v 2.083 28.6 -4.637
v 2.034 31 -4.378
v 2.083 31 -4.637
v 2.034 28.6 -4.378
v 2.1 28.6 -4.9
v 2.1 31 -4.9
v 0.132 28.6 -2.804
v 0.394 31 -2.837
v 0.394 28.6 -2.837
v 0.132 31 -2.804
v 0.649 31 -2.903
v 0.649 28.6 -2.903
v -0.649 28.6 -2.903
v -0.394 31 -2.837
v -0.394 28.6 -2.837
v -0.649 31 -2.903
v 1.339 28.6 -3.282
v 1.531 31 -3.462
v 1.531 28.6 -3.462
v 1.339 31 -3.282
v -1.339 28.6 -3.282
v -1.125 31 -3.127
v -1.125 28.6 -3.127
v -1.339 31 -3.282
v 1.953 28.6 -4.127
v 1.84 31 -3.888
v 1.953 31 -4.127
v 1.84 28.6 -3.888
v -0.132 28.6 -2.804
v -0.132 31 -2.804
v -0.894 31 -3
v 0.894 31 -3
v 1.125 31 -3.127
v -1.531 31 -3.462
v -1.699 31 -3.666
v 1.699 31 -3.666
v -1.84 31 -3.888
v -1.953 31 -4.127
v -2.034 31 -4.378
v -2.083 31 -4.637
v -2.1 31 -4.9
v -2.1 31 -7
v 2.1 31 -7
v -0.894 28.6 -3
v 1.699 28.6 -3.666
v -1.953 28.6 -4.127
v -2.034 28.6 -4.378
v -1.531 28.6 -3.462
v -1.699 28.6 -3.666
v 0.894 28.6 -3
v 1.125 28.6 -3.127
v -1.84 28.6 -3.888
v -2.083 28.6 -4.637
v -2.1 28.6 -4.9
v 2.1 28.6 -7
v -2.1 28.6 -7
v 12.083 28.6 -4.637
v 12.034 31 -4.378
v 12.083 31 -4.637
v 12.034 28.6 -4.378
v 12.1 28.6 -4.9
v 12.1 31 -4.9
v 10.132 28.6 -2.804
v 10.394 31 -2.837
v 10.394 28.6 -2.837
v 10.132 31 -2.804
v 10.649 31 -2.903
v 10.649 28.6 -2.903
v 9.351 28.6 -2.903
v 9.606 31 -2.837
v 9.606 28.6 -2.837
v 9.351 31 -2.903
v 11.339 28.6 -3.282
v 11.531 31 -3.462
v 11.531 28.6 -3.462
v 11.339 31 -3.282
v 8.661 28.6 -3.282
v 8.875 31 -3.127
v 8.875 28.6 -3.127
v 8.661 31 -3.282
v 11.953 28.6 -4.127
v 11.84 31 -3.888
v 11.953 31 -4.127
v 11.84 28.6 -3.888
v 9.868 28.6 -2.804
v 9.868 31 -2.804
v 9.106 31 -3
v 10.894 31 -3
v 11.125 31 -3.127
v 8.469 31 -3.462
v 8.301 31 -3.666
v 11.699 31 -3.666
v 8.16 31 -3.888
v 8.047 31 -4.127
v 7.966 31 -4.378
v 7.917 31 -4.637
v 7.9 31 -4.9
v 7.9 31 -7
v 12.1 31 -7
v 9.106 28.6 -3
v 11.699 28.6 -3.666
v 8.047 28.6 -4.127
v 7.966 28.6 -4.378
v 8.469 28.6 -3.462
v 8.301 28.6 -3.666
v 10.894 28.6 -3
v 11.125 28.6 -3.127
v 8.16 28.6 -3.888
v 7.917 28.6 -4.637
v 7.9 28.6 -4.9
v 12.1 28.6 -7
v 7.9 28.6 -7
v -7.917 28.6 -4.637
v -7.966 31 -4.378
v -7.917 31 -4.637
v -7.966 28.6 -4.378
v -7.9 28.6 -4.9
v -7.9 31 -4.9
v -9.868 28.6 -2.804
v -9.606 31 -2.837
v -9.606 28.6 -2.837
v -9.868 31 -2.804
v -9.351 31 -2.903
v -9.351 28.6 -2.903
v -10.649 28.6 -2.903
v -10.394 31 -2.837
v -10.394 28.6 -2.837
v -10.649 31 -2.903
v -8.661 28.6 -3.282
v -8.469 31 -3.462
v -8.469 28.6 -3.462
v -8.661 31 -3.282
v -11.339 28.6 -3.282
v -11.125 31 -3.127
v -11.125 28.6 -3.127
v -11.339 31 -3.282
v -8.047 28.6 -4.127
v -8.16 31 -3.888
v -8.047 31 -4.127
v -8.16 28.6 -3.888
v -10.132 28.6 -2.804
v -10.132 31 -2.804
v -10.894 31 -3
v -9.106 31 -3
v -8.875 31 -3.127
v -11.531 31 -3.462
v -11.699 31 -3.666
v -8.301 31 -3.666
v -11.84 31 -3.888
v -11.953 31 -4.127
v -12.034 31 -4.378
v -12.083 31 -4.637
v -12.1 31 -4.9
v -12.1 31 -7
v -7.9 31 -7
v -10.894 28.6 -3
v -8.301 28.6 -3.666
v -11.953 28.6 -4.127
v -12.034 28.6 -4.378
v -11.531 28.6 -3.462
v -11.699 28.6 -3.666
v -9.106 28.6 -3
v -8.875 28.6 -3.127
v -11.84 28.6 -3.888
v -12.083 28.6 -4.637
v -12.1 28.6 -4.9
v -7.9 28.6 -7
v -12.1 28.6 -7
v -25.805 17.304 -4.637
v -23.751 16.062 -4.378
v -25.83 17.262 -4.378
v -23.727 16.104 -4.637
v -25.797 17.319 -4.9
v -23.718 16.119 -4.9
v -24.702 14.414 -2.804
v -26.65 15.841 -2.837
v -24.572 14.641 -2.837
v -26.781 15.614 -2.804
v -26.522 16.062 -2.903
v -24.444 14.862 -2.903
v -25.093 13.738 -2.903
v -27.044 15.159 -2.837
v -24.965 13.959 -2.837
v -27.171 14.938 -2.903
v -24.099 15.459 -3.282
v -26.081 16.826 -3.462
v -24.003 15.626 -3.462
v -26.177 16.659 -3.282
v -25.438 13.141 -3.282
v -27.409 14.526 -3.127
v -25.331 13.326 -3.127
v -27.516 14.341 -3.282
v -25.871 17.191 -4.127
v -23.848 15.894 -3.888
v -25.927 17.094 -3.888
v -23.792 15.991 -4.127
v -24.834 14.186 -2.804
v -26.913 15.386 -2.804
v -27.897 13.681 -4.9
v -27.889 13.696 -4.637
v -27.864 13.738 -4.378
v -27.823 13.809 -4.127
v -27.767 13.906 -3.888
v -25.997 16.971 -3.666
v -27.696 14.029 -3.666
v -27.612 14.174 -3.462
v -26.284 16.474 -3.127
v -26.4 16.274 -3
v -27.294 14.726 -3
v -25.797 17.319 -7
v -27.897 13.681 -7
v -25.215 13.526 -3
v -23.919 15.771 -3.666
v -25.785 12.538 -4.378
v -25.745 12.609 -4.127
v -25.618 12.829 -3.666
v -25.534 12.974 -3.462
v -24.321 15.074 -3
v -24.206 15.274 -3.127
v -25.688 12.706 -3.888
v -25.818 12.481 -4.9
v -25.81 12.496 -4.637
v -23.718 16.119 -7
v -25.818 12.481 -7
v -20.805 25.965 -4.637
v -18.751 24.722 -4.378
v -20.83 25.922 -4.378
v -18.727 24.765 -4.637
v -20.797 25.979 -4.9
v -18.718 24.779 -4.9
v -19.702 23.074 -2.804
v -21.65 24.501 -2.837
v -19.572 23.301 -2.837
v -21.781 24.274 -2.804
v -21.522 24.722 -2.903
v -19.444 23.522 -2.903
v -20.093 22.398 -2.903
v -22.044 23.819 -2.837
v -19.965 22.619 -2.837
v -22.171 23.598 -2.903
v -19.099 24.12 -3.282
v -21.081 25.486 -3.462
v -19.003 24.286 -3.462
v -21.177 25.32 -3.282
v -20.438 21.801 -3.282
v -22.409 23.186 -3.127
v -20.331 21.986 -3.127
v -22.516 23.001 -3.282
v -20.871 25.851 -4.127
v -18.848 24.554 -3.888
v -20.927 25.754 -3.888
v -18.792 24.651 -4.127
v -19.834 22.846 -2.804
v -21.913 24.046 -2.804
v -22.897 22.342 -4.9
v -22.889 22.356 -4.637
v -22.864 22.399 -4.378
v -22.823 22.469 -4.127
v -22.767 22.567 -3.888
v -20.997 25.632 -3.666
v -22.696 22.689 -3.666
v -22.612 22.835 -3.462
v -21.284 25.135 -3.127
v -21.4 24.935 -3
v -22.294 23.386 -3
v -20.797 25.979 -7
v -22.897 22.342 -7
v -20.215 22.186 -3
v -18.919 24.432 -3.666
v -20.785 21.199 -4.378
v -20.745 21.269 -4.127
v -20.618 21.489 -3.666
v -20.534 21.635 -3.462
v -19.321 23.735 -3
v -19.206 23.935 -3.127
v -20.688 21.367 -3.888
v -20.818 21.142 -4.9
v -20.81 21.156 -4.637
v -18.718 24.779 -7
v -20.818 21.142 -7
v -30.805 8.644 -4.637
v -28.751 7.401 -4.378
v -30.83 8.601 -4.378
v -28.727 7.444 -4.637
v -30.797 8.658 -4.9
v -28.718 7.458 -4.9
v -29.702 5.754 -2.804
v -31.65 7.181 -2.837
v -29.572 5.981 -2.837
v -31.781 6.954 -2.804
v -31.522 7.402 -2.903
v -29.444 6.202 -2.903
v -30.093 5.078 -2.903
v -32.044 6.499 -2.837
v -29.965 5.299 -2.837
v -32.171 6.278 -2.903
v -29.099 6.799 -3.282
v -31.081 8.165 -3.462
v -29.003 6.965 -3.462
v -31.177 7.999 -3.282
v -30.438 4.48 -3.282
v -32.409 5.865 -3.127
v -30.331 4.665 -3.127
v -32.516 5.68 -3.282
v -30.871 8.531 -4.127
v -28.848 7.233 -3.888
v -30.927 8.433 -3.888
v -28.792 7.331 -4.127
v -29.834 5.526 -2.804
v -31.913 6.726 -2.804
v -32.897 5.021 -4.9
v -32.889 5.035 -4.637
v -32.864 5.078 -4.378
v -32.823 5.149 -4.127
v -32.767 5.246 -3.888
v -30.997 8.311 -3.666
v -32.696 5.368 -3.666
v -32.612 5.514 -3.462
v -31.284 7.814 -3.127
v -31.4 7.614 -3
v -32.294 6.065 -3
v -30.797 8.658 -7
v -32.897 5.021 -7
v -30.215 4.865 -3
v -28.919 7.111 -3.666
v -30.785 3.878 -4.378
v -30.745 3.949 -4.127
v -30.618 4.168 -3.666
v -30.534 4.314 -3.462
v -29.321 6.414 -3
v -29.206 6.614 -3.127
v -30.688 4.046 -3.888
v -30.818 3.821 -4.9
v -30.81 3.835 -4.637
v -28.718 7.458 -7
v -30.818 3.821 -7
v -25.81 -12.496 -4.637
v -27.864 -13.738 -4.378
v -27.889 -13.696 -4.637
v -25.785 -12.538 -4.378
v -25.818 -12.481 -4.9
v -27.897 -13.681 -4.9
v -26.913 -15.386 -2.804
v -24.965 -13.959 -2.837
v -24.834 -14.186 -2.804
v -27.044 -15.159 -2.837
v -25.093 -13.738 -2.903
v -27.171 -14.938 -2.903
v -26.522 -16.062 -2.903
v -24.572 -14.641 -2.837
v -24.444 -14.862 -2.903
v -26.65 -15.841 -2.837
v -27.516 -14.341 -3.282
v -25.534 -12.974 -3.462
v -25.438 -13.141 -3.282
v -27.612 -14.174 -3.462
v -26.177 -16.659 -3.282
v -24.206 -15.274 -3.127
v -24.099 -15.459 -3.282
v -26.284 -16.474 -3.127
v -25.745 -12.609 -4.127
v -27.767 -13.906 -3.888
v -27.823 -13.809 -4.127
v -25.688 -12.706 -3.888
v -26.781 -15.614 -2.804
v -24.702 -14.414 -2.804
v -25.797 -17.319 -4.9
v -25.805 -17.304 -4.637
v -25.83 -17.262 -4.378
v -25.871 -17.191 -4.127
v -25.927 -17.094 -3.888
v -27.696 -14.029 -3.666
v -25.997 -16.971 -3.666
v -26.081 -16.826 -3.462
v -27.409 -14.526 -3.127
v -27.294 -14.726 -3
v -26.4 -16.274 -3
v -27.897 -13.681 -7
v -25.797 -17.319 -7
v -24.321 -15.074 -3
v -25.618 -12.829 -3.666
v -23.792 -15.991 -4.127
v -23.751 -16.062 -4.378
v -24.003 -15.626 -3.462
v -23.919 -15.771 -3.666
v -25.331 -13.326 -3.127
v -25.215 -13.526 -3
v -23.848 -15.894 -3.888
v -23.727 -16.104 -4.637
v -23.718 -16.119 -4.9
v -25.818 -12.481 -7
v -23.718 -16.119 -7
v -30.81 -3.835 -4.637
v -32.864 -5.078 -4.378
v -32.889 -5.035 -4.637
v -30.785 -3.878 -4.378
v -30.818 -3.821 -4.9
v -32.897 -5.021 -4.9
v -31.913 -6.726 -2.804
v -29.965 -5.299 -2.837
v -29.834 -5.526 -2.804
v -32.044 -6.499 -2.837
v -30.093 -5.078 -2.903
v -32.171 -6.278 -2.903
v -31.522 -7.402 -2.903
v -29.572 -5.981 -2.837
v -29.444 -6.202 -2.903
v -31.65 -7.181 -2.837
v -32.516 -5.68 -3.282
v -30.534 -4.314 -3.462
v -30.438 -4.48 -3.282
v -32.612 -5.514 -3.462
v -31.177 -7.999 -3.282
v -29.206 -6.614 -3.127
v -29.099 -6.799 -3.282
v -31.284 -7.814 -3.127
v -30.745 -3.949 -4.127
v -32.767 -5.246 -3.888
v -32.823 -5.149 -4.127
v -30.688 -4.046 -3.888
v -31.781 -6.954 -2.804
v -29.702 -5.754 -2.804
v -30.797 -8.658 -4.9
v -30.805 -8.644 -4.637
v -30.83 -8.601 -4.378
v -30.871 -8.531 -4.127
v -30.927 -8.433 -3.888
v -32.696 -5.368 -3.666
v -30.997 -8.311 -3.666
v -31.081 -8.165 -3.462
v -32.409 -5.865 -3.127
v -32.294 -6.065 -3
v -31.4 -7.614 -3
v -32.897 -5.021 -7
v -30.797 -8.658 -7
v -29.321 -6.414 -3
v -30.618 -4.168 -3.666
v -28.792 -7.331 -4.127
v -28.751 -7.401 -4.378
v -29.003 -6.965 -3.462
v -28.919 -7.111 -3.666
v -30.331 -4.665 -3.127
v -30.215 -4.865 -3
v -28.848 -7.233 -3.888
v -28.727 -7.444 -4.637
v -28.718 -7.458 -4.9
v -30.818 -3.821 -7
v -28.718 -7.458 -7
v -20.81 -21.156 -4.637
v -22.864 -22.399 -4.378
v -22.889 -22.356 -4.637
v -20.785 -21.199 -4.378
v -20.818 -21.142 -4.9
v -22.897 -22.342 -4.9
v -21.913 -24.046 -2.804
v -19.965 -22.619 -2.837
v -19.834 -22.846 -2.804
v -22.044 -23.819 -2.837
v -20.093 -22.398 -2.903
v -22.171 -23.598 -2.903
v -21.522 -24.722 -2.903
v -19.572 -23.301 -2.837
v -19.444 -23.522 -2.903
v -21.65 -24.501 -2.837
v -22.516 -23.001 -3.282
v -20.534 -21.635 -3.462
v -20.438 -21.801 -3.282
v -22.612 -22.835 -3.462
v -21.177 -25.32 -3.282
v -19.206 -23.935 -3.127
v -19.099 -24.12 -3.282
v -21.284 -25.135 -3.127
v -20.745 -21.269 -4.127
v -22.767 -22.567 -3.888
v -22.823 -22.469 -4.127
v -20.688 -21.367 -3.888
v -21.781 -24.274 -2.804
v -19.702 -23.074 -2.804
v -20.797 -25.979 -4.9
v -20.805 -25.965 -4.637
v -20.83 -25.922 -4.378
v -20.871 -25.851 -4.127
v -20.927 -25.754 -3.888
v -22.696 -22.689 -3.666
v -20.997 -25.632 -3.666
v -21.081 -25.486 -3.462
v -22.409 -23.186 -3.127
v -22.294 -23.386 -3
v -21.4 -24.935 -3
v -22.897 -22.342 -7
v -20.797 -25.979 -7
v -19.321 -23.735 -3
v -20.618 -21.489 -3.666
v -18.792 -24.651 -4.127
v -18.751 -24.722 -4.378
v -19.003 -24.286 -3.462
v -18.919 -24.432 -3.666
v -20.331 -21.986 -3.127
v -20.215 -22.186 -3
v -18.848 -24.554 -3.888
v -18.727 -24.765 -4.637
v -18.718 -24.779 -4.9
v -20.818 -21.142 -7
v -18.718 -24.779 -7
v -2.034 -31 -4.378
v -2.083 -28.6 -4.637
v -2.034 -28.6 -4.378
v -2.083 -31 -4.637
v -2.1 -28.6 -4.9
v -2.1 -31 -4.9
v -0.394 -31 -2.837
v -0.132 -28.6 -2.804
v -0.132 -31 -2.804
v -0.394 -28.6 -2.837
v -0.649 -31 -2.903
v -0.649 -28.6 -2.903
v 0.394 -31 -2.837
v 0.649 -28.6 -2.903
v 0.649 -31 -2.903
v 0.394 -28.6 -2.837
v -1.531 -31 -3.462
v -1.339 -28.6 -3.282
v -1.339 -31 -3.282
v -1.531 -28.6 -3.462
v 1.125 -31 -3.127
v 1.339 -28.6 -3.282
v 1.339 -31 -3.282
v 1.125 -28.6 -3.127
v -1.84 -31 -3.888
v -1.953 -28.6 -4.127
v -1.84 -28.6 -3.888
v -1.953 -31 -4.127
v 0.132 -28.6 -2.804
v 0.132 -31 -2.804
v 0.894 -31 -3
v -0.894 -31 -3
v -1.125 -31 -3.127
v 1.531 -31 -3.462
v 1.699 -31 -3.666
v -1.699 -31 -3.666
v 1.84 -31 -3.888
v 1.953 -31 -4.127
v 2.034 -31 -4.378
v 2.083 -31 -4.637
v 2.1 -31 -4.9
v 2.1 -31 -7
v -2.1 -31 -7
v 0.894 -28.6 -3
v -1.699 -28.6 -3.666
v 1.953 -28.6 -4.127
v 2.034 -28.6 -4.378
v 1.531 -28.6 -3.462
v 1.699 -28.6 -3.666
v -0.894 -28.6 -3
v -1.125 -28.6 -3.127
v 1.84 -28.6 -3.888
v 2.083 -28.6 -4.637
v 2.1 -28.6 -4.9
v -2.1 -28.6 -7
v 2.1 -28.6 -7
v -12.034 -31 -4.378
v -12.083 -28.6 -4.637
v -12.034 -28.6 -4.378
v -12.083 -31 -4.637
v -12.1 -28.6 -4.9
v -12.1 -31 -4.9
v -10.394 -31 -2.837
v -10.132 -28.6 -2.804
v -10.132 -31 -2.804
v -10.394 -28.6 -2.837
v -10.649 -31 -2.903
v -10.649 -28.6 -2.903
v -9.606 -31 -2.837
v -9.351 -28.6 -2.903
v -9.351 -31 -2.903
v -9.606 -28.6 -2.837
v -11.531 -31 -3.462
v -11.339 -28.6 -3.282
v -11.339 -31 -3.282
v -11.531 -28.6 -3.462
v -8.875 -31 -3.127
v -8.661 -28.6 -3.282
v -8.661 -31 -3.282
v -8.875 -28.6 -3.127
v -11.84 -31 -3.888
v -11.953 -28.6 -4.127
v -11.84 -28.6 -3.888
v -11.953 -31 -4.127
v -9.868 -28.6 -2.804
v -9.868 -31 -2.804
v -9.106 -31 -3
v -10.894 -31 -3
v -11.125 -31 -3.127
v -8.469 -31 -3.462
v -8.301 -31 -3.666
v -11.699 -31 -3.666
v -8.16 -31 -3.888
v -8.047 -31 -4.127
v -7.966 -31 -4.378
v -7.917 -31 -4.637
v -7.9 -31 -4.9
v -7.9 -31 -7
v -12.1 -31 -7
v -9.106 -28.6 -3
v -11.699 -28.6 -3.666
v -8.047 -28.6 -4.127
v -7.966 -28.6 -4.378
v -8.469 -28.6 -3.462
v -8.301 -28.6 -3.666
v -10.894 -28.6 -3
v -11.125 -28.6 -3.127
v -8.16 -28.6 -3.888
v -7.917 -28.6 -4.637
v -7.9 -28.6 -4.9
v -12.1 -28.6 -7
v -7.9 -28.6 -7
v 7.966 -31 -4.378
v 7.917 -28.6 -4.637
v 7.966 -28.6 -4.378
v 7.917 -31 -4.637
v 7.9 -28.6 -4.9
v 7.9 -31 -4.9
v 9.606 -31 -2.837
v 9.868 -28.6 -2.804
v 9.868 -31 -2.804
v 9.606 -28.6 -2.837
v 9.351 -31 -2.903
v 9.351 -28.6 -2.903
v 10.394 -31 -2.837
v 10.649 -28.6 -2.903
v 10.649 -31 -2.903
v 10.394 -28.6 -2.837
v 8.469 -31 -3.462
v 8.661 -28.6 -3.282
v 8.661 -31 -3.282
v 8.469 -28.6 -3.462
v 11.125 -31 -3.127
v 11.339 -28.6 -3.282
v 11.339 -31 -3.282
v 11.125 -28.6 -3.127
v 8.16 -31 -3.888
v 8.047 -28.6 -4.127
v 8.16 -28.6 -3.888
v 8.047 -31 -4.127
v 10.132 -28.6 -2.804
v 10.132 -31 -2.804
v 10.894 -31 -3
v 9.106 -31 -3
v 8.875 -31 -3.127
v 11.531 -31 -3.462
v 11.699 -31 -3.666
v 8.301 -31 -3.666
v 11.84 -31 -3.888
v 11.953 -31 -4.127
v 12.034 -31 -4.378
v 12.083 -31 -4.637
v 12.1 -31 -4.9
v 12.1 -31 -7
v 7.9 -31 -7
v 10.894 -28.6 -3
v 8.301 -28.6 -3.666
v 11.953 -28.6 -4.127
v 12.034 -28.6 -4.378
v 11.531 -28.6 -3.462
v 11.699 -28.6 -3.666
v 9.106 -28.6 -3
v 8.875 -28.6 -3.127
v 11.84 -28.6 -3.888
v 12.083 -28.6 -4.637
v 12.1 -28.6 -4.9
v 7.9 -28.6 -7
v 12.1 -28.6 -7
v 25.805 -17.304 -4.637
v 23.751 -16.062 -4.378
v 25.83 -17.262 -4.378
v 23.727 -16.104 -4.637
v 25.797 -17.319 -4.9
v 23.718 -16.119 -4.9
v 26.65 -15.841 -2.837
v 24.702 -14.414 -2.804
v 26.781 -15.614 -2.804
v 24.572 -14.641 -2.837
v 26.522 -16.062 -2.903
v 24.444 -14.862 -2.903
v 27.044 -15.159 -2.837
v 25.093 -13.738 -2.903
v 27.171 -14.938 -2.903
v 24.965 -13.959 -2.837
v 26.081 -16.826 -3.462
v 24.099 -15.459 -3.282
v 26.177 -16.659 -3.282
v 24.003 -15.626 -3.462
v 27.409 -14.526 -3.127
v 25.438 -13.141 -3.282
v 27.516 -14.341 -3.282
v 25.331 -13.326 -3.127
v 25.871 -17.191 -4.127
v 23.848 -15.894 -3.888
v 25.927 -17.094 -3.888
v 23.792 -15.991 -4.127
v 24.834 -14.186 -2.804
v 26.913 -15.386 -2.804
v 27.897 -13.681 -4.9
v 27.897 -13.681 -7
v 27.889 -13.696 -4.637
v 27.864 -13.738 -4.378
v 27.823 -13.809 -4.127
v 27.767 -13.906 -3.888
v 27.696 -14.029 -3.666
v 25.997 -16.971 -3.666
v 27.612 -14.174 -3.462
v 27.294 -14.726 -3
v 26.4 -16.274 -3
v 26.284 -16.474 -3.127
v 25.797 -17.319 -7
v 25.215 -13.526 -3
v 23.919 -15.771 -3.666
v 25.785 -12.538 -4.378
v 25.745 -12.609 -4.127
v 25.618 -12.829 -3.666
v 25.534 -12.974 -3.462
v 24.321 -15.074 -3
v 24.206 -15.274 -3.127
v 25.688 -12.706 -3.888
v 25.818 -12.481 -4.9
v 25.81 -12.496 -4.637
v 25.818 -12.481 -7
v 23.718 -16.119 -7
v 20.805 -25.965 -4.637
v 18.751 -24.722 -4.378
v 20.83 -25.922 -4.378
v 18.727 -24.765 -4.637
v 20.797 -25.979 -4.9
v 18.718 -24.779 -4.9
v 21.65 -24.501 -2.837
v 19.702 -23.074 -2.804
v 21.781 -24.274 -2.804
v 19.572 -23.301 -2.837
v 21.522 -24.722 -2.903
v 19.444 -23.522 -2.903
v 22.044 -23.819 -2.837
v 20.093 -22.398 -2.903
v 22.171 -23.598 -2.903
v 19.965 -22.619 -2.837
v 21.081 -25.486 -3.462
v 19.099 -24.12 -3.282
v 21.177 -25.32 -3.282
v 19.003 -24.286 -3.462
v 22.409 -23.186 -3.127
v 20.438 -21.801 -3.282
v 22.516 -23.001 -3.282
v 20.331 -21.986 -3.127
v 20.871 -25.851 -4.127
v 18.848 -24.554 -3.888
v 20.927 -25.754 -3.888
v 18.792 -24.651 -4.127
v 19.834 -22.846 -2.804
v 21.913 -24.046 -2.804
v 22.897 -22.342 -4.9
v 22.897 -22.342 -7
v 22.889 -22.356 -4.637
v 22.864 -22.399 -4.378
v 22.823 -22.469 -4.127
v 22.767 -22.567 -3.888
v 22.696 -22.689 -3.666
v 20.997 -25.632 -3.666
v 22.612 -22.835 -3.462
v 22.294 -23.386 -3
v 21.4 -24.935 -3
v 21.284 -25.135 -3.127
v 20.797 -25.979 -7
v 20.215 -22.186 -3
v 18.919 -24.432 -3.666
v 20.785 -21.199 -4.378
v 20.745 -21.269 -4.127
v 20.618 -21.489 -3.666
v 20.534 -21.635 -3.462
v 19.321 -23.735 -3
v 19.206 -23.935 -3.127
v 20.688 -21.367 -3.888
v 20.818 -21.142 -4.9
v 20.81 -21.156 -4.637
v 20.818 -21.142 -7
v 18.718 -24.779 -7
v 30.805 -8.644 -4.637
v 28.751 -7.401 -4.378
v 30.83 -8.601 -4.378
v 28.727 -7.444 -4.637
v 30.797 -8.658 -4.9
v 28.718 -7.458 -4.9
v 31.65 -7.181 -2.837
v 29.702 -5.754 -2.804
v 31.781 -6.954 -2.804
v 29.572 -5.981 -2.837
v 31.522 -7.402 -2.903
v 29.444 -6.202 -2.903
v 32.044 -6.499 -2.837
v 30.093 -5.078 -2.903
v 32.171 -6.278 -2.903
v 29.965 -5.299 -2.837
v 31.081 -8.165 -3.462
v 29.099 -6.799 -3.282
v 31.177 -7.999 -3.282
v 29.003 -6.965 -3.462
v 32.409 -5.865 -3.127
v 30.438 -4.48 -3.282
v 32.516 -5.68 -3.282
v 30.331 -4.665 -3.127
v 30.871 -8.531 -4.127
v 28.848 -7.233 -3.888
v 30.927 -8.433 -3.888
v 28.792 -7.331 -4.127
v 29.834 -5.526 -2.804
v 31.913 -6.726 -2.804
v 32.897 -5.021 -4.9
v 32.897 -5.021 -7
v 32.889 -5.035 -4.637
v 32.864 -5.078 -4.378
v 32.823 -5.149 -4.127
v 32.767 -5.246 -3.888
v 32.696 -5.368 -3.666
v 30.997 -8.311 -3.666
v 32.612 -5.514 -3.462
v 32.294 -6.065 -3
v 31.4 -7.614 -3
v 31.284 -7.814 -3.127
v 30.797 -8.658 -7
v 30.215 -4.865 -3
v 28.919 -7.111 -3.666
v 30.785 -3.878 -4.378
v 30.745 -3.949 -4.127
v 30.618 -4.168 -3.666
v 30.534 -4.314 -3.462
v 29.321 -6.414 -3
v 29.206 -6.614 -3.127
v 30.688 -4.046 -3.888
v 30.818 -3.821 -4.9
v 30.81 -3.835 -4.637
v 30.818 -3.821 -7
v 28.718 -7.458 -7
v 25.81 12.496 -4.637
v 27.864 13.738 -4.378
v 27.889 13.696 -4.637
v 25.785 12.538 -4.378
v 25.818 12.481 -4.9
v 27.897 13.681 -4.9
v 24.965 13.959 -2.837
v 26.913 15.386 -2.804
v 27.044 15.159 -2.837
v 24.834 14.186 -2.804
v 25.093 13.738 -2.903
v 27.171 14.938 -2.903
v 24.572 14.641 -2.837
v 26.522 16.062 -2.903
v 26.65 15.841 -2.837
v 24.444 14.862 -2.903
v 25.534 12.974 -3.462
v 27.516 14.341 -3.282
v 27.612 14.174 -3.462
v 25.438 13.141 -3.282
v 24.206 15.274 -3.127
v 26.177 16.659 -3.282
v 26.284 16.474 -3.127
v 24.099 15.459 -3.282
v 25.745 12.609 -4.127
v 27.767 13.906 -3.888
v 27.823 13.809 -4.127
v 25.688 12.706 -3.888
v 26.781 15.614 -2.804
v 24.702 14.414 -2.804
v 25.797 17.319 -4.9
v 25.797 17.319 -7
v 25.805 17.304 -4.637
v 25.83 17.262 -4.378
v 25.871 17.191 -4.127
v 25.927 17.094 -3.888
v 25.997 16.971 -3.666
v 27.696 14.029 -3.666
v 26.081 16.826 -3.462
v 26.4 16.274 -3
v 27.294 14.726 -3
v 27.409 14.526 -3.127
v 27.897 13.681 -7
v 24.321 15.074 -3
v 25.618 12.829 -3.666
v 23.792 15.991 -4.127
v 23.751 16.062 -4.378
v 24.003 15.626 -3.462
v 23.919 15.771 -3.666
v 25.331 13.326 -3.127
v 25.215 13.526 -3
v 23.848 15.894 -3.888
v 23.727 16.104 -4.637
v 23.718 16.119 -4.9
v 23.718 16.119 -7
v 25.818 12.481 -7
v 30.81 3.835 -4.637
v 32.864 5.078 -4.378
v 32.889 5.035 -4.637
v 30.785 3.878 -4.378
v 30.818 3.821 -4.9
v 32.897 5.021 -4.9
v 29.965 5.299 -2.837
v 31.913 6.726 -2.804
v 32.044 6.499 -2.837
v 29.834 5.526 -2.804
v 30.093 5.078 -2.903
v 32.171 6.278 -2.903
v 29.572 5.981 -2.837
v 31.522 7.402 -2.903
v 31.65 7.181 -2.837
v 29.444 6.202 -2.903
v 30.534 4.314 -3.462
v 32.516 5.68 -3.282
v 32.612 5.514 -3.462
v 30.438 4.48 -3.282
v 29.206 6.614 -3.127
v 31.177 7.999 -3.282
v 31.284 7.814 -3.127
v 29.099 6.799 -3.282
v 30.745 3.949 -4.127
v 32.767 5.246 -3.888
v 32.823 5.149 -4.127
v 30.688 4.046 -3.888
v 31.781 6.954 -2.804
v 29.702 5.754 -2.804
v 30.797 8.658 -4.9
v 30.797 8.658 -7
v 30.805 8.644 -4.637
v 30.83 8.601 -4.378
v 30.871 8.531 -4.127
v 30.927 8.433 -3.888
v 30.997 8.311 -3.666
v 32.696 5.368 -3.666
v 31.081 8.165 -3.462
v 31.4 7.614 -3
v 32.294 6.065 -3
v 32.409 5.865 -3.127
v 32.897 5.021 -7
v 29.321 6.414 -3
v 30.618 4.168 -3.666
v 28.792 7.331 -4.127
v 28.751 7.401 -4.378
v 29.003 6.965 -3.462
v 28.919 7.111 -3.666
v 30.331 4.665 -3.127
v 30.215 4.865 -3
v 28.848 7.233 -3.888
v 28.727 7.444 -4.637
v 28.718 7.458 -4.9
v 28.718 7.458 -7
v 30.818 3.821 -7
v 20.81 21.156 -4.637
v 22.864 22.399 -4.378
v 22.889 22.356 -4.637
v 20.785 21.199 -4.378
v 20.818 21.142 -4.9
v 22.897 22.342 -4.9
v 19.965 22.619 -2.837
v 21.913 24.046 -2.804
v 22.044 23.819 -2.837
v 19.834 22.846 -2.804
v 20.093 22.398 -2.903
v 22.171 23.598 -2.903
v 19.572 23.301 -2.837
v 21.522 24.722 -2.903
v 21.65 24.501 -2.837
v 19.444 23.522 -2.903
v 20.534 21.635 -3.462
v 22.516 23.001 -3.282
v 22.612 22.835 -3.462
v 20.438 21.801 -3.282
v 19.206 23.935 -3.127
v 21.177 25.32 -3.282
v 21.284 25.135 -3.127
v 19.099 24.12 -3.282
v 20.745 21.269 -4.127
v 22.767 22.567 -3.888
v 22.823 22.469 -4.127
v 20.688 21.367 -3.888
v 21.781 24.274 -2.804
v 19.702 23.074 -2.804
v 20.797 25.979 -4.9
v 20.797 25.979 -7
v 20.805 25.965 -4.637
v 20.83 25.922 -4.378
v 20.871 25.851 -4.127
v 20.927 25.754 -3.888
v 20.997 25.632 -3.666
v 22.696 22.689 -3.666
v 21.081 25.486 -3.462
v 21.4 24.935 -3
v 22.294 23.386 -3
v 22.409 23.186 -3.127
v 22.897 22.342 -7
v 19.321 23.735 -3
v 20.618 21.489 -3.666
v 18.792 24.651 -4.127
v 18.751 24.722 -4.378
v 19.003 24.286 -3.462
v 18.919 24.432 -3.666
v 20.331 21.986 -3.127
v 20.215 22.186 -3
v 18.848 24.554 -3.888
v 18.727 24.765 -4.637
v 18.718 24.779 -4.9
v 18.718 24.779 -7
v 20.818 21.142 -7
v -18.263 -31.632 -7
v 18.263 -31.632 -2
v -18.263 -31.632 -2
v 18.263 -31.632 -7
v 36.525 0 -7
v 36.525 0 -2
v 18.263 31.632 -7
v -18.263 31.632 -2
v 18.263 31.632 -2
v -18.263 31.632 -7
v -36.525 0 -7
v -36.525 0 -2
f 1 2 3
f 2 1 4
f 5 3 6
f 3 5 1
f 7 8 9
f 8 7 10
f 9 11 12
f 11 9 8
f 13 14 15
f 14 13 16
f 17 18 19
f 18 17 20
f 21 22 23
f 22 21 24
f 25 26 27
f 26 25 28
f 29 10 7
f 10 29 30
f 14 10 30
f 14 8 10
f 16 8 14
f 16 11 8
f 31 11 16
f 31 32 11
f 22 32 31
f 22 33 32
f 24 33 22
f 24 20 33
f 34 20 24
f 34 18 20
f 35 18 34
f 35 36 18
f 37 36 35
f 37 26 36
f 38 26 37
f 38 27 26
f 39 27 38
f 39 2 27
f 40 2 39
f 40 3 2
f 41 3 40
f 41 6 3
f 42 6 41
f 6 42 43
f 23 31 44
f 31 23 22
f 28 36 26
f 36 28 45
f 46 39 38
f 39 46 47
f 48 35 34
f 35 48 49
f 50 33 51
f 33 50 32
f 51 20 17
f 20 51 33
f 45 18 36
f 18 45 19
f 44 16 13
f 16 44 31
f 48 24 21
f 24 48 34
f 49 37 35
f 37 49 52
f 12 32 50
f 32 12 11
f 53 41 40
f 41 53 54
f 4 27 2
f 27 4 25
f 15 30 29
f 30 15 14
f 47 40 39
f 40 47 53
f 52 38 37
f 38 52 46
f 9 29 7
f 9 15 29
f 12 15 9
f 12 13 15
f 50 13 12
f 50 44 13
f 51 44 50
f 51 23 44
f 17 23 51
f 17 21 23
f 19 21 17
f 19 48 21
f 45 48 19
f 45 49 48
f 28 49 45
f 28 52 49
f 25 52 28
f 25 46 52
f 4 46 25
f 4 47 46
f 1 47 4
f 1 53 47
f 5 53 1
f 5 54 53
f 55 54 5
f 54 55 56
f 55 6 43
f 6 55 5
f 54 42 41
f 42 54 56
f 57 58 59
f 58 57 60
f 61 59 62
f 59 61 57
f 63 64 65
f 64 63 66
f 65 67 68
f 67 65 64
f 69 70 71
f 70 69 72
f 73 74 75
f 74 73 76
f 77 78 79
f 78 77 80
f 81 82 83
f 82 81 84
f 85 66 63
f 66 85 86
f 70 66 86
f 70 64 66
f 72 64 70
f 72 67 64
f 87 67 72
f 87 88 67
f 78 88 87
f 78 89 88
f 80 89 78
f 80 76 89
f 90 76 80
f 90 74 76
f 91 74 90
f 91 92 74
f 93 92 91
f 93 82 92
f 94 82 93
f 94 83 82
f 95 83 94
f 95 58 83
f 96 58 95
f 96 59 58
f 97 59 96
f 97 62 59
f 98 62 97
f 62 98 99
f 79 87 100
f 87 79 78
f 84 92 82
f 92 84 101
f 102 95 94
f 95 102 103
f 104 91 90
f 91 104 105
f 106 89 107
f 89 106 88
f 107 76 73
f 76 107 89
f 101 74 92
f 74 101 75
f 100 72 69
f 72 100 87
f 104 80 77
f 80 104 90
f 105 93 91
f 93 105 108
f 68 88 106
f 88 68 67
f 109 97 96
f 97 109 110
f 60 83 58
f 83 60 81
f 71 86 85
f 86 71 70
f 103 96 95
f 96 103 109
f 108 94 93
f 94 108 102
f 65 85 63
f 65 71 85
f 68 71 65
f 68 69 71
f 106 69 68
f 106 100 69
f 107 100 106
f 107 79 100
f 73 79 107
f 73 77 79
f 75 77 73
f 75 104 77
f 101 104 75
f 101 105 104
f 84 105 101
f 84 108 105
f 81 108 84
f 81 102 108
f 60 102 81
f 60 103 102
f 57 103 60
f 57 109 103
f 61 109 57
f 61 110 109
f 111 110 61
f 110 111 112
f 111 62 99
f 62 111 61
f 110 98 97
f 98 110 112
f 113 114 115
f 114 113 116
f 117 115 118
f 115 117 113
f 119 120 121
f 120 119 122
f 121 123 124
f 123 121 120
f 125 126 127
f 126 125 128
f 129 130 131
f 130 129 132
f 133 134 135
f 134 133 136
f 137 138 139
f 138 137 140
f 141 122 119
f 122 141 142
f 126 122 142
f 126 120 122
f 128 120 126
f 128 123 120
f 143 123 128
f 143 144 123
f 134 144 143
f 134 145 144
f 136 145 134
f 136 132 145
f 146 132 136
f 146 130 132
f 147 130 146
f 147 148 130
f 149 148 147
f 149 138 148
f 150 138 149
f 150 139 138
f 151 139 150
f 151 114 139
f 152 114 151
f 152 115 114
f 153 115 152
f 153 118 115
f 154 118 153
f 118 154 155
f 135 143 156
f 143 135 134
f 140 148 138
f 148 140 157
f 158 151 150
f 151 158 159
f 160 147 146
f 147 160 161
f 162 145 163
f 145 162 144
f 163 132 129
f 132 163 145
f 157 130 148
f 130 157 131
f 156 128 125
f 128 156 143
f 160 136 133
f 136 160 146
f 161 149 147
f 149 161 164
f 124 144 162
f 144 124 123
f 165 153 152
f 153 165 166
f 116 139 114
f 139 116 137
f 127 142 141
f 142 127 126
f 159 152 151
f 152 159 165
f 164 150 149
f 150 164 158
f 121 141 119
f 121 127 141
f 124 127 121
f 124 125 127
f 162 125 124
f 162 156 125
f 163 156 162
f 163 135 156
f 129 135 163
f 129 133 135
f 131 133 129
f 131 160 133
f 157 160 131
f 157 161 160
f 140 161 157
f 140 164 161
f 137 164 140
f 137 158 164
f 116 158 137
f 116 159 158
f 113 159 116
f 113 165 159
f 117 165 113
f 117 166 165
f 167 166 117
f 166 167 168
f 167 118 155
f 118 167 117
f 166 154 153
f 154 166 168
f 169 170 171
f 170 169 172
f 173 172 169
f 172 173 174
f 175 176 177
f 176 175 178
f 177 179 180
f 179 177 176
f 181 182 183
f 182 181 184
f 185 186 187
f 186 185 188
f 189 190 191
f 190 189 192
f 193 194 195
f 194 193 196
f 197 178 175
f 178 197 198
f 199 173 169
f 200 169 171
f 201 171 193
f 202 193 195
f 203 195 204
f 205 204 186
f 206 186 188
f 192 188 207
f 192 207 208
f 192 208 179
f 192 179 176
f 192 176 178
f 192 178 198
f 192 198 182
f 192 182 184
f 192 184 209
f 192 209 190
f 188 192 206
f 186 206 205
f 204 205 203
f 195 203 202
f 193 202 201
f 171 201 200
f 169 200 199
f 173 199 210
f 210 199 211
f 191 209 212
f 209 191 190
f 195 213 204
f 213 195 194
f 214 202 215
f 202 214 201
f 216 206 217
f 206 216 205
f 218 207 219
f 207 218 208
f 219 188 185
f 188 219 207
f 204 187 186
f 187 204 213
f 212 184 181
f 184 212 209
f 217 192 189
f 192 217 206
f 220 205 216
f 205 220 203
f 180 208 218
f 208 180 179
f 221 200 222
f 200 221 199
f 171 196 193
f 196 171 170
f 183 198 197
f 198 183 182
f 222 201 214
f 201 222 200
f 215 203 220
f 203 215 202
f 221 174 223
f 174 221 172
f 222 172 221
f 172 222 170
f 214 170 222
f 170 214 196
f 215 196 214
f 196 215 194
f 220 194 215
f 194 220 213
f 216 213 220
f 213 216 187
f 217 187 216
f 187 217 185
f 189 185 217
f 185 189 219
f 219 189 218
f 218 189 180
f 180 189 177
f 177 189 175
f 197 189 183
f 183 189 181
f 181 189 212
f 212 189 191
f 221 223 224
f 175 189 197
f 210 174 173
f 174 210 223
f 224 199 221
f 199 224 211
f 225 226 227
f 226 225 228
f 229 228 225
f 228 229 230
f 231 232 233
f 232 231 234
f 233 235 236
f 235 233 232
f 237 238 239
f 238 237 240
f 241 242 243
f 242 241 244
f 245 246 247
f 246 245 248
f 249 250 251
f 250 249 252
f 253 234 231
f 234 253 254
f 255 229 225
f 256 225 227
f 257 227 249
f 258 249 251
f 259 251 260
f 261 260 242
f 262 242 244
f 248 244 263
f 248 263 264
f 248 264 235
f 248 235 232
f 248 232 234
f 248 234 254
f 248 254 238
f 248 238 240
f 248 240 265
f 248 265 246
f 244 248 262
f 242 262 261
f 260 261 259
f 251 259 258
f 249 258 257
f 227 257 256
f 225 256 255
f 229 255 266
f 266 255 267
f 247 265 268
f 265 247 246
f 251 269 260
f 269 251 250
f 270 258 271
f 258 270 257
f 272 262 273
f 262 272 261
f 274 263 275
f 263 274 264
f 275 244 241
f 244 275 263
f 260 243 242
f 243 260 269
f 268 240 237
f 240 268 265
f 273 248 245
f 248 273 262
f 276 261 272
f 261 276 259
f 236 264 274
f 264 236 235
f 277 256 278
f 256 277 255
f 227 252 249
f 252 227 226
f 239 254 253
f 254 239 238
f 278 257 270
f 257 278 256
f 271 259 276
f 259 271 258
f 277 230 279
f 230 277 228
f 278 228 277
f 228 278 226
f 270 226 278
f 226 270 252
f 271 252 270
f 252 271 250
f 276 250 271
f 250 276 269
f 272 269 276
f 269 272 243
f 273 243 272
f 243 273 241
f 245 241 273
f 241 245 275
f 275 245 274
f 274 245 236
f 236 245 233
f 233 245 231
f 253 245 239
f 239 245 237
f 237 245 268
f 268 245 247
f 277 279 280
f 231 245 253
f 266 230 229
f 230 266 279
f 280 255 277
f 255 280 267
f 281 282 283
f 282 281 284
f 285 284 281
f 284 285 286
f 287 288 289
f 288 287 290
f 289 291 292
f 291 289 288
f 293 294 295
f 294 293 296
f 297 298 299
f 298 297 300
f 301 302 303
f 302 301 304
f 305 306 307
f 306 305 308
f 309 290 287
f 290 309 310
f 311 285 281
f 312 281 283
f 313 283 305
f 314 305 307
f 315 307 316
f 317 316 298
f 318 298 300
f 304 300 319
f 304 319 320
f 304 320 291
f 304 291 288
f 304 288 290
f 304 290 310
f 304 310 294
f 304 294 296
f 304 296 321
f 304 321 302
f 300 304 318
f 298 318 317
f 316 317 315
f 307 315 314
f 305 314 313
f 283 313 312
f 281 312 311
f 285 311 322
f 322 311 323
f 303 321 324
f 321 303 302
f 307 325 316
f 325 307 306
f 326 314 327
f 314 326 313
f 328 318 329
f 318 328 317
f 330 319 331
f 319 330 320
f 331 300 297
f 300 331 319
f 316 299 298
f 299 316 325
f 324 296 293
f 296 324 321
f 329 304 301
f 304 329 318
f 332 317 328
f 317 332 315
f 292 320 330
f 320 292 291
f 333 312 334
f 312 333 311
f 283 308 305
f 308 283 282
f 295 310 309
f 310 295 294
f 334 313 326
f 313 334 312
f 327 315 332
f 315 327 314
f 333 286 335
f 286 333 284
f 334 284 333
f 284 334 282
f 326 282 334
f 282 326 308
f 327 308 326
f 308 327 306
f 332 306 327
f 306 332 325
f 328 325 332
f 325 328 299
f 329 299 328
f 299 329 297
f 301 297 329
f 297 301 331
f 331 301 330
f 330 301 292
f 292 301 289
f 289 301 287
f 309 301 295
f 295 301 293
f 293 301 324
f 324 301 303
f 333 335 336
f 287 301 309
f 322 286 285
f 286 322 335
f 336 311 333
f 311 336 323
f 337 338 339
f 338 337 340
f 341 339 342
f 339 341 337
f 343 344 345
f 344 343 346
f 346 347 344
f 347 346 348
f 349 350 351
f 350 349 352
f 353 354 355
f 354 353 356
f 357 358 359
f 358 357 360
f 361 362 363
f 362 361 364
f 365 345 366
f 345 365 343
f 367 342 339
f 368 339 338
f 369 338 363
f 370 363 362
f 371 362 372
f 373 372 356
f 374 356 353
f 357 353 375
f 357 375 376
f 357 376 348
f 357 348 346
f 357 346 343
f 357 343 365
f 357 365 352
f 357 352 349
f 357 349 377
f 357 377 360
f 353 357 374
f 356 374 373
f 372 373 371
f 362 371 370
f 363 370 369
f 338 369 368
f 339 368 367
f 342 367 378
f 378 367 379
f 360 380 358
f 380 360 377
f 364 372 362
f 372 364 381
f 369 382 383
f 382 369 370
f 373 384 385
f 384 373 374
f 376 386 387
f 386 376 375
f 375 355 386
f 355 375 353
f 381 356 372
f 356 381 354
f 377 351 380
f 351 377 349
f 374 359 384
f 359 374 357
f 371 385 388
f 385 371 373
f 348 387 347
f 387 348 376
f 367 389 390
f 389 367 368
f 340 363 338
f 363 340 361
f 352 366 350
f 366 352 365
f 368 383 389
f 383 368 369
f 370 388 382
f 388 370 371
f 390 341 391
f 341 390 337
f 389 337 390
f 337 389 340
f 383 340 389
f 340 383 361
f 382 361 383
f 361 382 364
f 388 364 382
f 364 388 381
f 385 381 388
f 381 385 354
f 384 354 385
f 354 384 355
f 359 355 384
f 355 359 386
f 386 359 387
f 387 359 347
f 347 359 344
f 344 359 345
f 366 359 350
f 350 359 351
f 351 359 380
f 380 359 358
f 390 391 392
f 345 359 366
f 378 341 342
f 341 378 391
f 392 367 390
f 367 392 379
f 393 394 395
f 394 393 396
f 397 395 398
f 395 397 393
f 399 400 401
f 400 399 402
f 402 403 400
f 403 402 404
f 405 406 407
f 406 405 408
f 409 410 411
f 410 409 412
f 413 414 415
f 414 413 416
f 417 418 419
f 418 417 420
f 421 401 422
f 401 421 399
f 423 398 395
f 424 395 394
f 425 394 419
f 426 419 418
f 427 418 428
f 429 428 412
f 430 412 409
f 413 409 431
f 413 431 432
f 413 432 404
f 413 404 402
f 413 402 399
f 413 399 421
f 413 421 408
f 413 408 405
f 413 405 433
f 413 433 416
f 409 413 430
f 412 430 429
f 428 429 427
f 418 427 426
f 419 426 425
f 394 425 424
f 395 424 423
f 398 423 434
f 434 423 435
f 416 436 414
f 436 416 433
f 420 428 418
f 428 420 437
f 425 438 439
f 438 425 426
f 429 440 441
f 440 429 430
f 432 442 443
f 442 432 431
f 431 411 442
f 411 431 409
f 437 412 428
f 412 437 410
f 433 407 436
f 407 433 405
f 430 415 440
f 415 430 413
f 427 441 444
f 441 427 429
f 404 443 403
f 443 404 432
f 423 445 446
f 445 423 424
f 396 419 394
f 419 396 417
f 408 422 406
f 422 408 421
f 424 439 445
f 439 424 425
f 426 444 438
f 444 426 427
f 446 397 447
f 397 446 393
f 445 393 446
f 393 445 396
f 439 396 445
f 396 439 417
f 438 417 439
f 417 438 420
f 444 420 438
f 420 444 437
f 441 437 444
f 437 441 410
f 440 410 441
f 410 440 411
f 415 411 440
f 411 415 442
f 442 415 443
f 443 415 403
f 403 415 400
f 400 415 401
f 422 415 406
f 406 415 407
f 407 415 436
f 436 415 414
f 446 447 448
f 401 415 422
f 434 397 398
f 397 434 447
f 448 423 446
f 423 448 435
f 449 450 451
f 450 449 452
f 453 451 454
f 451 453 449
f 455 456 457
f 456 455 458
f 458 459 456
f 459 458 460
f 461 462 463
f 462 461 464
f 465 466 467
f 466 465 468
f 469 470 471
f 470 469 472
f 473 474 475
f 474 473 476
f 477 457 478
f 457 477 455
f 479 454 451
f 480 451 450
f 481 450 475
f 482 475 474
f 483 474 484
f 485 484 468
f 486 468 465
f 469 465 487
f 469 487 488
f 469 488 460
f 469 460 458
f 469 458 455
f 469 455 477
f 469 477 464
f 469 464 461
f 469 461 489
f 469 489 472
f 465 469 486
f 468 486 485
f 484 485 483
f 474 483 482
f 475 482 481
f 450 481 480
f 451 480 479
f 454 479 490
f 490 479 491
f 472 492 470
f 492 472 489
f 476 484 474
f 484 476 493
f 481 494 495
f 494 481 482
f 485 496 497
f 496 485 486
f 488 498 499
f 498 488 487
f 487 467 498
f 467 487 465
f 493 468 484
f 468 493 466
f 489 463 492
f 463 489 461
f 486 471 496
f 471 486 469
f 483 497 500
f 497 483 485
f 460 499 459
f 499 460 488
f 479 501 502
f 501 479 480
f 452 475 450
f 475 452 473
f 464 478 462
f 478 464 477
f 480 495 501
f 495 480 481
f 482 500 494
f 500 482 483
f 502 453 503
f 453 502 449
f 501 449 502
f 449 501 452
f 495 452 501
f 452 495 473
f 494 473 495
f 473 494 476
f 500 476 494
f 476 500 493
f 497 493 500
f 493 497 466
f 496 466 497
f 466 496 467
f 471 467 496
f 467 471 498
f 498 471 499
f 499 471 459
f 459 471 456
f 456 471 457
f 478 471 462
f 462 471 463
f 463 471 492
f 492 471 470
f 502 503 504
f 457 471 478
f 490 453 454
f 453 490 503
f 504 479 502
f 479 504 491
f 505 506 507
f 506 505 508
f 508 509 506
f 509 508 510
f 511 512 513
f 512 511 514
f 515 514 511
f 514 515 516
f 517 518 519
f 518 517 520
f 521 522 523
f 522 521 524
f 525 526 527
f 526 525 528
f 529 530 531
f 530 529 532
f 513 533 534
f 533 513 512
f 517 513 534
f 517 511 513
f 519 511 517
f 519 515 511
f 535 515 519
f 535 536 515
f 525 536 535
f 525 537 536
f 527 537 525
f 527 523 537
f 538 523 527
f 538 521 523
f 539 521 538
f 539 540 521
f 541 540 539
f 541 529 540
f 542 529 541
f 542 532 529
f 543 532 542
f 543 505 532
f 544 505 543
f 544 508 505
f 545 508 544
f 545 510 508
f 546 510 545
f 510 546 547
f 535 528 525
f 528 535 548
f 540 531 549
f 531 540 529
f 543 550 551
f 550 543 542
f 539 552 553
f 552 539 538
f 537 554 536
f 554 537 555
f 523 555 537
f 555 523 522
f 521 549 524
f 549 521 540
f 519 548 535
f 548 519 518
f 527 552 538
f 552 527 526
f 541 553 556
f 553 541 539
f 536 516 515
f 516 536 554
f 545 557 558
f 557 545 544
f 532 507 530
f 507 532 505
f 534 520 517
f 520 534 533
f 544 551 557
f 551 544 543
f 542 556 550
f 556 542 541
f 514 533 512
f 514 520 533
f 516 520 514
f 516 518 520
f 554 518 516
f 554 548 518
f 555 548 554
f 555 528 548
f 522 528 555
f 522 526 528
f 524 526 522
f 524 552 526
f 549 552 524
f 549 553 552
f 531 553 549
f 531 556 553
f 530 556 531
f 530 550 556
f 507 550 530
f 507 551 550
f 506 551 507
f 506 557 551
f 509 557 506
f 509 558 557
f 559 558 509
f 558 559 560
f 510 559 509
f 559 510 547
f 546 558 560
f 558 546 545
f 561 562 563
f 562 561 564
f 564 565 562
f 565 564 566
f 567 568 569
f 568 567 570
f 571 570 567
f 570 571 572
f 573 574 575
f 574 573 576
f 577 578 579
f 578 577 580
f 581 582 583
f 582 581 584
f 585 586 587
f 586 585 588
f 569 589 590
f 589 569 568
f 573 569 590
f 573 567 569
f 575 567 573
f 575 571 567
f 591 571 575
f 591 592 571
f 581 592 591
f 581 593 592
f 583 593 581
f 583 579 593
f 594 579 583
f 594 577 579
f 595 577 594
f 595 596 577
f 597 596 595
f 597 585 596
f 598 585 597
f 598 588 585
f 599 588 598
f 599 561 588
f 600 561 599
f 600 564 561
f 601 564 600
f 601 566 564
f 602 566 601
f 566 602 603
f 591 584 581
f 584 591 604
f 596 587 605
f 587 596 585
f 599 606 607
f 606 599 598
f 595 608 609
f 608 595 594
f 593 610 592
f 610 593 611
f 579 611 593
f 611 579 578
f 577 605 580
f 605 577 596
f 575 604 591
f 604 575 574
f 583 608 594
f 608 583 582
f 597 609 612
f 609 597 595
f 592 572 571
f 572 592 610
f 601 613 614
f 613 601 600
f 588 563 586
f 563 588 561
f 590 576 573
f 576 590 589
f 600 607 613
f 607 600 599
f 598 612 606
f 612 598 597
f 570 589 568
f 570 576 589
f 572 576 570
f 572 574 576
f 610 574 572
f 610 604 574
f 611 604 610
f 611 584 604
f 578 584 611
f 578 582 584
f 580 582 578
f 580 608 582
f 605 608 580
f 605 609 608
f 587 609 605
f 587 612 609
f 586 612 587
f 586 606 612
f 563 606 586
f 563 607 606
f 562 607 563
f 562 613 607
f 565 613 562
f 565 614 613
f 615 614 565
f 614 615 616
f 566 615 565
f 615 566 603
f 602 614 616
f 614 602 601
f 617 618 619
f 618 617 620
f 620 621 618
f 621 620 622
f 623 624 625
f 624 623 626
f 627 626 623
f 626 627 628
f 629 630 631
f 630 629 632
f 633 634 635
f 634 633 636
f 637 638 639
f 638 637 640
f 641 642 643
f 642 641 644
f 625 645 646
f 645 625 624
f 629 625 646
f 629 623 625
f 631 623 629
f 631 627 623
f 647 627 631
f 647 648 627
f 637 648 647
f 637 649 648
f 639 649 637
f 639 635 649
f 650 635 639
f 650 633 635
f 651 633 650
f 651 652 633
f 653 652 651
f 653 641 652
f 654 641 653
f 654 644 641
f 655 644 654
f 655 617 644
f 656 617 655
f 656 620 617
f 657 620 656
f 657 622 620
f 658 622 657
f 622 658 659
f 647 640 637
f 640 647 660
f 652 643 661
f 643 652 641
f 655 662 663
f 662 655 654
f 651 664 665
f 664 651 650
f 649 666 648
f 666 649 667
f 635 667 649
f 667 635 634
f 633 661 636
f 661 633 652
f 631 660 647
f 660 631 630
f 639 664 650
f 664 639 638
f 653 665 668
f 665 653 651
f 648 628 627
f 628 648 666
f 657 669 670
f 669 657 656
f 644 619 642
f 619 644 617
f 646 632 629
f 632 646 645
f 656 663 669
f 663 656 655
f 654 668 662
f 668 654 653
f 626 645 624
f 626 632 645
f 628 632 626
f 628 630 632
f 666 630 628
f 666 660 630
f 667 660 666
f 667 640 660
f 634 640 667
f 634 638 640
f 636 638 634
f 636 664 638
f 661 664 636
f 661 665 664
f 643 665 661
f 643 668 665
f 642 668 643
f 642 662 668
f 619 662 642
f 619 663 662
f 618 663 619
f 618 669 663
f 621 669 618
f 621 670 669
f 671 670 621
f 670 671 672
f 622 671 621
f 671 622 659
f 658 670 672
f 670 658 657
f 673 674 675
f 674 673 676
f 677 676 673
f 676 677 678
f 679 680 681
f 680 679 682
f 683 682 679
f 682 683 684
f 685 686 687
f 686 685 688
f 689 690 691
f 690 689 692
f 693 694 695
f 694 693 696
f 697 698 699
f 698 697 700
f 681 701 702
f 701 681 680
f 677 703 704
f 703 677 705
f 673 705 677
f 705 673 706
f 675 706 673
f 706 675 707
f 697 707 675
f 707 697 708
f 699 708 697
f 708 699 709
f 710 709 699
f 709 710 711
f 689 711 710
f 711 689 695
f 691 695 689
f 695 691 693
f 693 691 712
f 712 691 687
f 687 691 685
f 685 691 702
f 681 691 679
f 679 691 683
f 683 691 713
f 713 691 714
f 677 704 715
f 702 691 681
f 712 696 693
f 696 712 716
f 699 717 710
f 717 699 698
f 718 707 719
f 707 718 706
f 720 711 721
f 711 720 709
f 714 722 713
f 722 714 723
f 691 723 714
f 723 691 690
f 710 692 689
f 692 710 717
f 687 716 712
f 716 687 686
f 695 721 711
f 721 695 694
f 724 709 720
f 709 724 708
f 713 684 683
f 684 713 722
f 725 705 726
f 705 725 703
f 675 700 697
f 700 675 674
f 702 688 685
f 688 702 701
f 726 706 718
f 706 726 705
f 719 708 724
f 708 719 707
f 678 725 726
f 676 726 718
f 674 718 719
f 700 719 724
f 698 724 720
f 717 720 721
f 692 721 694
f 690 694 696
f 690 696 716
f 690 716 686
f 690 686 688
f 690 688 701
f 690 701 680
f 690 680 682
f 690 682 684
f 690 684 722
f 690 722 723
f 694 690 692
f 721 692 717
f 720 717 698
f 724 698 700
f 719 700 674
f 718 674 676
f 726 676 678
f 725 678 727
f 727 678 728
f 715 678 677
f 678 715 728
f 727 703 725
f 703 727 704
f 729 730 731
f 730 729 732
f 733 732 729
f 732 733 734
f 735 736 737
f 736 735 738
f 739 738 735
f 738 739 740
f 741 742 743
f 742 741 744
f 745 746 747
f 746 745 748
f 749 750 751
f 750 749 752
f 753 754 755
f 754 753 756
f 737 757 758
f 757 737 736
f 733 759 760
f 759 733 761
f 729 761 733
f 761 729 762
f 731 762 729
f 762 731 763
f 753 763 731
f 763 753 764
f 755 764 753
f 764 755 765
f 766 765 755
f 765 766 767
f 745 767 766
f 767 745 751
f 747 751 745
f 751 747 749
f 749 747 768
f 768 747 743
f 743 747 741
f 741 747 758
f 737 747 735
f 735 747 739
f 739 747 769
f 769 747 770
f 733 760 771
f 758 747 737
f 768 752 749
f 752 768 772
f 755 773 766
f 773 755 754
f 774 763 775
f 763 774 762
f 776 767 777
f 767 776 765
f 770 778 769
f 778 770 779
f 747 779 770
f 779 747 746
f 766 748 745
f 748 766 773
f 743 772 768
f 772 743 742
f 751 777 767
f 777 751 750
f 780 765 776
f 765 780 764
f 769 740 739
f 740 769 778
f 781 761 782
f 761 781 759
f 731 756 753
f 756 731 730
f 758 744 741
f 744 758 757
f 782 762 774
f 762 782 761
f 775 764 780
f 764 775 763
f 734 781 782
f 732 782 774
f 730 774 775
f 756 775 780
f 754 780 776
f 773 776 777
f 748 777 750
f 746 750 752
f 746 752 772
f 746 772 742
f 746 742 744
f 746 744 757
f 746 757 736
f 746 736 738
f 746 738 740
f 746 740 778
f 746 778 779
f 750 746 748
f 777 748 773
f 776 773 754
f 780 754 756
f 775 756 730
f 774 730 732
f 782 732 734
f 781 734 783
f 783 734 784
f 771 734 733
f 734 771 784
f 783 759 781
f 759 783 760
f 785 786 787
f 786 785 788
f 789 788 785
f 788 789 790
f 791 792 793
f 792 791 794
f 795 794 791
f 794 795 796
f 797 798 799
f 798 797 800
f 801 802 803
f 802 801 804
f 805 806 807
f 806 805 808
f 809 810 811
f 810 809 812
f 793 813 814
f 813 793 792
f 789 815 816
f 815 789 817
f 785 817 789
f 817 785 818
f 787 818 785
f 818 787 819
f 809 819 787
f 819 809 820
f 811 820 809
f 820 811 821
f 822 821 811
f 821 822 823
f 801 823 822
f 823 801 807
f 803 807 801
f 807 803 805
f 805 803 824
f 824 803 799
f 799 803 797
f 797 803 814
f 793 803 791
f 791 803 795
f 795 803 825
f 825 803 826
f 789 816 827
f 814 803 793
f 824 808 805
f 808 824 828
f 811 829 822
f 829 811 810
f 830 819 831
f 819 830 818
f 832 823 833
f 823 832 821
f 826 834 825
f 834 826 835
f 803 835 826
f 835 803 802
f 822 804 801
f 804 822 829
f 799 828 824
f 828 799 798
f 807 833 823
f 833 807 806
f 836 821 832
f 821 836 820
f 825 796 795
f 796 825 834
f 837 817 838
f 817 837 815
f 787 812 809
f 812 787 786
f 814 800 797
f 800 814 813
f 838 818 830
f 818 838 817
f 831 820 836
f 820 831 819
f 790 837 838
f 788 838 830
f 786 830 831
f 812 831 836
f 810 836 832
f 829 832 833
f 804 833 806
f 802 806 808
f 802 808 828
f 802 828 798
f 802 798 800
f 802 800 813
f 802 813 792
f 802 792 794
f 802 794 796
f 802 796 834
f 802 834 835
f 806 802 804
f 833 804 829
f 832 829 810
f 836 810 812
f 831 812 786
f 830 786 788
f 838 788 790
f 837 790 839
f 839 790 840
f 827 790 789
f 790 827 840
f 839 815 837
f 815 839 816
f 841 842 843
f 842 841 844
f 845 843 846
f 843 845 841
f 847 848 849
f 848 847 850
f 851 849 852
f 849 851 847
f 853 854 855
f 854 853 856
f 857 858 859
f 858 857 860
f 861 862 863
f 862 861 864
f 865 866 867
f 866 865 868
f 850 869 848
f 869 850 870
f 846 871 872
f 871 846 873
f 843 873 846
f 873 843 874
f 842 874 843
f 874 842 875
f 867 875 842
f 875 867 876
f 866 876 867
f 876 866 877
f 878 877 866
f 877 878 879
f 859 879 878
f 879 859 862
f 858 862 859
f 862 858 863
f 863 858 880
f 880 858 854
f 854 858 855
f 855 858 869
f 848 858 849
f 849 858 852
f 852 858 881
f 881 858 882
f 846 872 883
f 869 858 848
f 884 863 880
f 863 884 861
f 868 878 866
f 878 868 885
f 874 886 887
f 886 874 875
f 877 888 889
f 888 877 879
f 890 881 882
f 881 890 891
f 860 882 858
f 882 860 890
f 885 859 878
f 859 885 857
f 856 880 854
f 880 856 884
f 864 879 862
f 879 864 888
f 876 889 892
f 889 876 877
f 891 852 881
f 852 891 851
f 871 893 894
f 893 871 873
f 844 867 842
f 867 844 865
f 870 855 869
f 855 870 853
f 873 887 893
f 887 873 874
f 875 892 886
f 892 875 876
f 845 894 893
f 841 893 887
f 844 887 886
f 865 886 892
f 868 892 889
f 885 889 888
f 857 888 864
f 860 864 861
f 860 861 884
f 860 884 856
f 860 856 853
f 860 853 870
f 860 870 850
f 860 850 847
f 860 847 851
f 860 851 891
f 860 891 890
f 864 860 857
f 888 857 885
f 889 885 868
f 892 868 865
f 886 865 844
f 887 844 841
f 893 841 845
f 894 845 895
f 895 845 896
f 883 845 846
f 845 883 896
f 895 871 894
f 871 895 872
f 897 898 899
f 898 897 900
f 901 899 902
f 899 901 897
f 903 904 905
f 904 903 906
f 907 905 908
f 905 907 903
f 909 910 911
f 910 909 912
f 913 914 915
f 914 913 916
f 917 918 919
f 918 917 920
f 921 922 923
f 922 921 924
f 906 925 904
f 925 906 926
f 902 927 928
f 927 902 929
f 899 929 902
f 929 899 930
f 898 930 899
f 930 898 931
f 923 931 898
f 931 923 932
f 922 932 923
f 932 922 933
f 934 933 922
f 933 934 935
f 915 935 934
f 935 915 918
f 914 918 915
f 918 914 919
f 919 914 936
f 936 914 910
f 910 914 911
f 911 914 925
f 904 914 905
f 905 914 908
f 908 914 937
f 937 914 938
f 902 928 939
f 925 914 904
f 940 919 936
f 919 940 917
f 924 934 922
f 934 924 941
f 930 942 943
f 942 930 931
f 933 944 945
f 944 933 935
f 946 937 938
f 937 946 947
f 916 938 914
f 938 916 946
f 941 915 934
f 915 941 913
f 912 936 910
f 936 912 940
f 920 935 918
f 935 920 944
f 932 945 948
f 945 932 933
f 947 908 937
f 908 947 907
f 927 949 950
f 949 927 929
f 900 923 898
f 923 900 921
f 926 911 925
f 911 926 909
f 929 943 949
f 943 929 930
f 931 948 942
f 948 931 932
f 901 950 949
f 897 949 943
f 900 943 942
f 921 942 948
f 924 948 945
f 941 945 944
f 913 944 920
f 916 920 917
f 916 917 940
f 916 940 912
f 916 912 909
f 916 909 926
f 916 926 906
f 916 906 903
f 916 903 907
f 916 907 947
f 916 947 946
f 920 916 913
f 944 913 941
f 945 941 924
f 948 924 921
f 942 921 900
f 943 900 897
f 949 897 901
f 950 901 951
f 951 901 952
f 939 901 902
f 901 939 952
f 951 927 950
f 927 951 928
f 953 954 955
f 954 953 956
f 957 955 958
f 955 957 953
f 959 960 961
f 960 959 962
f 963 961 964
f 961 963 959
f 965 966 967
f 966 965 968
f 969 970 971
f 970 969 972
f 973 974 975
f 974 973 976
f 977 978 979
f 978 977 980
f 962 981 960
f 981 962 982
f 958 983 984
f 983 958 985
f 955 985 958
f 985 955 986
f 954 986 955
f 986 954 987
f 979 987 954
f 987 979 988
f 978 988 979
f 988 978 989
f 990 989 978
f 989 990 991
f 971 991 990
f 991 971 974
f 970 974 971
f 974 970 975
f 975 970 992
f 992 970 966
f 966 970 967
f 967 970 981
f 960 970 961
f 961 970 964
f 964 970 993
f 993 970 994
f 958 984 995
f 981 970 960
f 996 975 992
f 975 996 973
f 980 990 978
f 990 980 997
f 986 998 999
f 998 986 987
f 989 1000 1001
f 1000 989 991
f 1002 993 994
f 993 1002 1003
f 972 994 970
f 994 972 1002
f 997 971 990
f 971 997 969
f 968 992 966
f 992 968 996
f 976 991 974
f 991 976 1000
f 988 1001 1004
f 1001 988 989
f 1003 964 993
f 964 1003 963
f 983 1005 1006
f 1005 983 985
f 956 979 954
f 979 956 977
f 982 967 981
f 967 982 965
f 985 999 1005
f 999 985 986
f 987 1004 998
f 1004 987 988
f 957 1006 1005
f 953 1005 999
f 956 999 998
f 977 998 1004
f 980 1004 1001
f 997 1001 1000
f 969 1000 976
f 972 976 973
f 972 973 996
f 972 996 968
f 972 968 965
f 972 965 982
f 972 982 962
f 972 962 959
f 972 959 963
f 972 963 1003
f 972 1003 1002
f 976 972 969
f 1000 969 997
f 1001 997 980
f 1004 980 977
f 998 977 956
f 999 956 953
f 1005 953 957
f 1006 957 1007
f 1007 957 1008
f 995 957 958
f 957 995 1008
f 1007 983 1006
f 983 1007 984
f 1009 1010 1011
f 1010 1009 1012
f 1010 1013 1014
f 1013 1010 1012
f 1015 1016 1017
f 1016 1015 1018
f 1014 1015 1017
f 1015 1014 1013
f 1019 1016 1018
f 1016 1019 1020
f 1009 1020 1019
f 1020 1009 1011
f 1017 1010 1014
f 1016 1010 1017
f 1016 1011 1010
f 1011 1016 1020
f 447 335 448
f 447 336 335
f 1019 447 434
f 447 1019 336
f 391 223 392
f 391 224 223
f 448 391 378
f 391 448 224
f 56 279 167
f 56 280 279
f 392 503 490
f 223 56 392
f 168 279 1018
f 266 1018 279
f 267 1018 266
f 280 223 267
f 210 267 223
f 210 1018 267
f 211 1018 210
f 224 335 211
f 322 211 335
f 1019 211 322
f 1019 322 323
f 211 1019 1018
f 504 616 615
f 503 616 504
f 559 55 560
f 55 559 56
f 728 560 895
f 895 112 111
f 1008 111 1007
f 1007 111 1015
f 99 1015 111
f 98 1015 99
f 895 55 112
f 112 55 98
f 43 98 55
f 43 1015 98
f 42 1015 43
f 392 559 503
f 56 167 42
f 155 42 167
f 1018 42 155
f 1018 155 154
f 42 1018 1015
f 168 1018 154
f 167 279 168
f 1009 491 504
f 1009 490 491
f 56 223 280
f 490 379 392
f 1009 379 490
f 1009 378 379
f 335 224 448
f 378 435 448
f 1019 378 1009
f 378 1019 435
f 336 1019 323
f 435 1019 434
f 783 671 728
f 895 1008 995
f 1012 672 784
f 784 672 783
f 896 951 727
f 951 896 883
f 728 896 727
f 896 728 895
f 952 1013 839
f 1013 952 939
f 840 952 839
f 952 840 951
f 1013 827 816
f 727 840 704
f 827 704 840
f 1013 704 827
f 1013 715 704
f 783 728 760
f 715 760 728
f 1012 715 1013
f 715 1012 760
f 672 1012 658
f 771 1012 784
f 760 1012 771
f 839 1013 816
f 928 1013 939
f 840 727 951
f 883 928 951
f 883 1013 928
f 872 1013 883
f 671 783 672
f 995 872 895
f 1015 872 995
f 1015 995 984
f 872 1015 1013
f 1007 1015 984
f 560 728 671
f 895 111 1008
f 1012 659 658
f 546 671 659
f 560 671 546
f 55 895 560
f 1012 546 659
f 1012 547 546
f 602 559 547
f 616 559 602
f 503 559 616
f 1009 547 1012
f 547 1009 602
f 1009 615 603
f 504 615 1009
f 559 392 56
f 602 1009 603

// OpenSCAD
MAGNET_RAD = 31;

// difference() {
//   scale([0.8, 0.8, 0.8]) 
//     import("C:/Users/AlexT/Desktop/3D Printing/settlers catan style (magnetic) - 1238980/files/catan_main_landscape_wood1_newbase.stl");

//    translate([-50, -50, -7])
//     cube(size=[100, 100, 5]);
// }



difference() {
translate([0, 0, -7])
  cylinder(r=36.525, h=5, $fn=6);

  all_magnets();
}

// difference() {
//   scale([0.8, 0.8, 0.8]) 
//     import("C:/Users/AlexT/Desktop/3D Printing/Settlers of Catan 3D Board - 2416602/files/catan_wood2.stl");

//    translate([-50, -50, -7])
//     cube(size=[100, 100, 5]);
// }


module all_magnets() {
  magnet_row(0);
  magnet_row(60);
  magnet_row(120);
  magnet_row(180);
  magnet_row(240);
  magnet_row(300);
}


module magnet_row(rot) {
  rotate([0, 0, rot]) {
    magnet(0, MAGNET_RAD);
    magnet(10, MAGNET_RAD);
    magnet(-10, MAGNET_RAD);

    // magnet(4, MAGNET_RAD);
    // magnet(12, MAGNET_RAD);
    // magnet(-4, MAGNET_RAD);
    // magnet(-12, MAGNET_RAD);
  }
}

module magnet(x, y) {
  translate([x, y, -4.9]) {
    rotate([90, 0, 0]) {
      cylinder(h = 2.4, r = 2.1, $fn=50);
      
      translate([0, -1.2, 1.2]) 
        cube(size=[4.2, 2.4, 2.4], center = true);
    }
  }
}
